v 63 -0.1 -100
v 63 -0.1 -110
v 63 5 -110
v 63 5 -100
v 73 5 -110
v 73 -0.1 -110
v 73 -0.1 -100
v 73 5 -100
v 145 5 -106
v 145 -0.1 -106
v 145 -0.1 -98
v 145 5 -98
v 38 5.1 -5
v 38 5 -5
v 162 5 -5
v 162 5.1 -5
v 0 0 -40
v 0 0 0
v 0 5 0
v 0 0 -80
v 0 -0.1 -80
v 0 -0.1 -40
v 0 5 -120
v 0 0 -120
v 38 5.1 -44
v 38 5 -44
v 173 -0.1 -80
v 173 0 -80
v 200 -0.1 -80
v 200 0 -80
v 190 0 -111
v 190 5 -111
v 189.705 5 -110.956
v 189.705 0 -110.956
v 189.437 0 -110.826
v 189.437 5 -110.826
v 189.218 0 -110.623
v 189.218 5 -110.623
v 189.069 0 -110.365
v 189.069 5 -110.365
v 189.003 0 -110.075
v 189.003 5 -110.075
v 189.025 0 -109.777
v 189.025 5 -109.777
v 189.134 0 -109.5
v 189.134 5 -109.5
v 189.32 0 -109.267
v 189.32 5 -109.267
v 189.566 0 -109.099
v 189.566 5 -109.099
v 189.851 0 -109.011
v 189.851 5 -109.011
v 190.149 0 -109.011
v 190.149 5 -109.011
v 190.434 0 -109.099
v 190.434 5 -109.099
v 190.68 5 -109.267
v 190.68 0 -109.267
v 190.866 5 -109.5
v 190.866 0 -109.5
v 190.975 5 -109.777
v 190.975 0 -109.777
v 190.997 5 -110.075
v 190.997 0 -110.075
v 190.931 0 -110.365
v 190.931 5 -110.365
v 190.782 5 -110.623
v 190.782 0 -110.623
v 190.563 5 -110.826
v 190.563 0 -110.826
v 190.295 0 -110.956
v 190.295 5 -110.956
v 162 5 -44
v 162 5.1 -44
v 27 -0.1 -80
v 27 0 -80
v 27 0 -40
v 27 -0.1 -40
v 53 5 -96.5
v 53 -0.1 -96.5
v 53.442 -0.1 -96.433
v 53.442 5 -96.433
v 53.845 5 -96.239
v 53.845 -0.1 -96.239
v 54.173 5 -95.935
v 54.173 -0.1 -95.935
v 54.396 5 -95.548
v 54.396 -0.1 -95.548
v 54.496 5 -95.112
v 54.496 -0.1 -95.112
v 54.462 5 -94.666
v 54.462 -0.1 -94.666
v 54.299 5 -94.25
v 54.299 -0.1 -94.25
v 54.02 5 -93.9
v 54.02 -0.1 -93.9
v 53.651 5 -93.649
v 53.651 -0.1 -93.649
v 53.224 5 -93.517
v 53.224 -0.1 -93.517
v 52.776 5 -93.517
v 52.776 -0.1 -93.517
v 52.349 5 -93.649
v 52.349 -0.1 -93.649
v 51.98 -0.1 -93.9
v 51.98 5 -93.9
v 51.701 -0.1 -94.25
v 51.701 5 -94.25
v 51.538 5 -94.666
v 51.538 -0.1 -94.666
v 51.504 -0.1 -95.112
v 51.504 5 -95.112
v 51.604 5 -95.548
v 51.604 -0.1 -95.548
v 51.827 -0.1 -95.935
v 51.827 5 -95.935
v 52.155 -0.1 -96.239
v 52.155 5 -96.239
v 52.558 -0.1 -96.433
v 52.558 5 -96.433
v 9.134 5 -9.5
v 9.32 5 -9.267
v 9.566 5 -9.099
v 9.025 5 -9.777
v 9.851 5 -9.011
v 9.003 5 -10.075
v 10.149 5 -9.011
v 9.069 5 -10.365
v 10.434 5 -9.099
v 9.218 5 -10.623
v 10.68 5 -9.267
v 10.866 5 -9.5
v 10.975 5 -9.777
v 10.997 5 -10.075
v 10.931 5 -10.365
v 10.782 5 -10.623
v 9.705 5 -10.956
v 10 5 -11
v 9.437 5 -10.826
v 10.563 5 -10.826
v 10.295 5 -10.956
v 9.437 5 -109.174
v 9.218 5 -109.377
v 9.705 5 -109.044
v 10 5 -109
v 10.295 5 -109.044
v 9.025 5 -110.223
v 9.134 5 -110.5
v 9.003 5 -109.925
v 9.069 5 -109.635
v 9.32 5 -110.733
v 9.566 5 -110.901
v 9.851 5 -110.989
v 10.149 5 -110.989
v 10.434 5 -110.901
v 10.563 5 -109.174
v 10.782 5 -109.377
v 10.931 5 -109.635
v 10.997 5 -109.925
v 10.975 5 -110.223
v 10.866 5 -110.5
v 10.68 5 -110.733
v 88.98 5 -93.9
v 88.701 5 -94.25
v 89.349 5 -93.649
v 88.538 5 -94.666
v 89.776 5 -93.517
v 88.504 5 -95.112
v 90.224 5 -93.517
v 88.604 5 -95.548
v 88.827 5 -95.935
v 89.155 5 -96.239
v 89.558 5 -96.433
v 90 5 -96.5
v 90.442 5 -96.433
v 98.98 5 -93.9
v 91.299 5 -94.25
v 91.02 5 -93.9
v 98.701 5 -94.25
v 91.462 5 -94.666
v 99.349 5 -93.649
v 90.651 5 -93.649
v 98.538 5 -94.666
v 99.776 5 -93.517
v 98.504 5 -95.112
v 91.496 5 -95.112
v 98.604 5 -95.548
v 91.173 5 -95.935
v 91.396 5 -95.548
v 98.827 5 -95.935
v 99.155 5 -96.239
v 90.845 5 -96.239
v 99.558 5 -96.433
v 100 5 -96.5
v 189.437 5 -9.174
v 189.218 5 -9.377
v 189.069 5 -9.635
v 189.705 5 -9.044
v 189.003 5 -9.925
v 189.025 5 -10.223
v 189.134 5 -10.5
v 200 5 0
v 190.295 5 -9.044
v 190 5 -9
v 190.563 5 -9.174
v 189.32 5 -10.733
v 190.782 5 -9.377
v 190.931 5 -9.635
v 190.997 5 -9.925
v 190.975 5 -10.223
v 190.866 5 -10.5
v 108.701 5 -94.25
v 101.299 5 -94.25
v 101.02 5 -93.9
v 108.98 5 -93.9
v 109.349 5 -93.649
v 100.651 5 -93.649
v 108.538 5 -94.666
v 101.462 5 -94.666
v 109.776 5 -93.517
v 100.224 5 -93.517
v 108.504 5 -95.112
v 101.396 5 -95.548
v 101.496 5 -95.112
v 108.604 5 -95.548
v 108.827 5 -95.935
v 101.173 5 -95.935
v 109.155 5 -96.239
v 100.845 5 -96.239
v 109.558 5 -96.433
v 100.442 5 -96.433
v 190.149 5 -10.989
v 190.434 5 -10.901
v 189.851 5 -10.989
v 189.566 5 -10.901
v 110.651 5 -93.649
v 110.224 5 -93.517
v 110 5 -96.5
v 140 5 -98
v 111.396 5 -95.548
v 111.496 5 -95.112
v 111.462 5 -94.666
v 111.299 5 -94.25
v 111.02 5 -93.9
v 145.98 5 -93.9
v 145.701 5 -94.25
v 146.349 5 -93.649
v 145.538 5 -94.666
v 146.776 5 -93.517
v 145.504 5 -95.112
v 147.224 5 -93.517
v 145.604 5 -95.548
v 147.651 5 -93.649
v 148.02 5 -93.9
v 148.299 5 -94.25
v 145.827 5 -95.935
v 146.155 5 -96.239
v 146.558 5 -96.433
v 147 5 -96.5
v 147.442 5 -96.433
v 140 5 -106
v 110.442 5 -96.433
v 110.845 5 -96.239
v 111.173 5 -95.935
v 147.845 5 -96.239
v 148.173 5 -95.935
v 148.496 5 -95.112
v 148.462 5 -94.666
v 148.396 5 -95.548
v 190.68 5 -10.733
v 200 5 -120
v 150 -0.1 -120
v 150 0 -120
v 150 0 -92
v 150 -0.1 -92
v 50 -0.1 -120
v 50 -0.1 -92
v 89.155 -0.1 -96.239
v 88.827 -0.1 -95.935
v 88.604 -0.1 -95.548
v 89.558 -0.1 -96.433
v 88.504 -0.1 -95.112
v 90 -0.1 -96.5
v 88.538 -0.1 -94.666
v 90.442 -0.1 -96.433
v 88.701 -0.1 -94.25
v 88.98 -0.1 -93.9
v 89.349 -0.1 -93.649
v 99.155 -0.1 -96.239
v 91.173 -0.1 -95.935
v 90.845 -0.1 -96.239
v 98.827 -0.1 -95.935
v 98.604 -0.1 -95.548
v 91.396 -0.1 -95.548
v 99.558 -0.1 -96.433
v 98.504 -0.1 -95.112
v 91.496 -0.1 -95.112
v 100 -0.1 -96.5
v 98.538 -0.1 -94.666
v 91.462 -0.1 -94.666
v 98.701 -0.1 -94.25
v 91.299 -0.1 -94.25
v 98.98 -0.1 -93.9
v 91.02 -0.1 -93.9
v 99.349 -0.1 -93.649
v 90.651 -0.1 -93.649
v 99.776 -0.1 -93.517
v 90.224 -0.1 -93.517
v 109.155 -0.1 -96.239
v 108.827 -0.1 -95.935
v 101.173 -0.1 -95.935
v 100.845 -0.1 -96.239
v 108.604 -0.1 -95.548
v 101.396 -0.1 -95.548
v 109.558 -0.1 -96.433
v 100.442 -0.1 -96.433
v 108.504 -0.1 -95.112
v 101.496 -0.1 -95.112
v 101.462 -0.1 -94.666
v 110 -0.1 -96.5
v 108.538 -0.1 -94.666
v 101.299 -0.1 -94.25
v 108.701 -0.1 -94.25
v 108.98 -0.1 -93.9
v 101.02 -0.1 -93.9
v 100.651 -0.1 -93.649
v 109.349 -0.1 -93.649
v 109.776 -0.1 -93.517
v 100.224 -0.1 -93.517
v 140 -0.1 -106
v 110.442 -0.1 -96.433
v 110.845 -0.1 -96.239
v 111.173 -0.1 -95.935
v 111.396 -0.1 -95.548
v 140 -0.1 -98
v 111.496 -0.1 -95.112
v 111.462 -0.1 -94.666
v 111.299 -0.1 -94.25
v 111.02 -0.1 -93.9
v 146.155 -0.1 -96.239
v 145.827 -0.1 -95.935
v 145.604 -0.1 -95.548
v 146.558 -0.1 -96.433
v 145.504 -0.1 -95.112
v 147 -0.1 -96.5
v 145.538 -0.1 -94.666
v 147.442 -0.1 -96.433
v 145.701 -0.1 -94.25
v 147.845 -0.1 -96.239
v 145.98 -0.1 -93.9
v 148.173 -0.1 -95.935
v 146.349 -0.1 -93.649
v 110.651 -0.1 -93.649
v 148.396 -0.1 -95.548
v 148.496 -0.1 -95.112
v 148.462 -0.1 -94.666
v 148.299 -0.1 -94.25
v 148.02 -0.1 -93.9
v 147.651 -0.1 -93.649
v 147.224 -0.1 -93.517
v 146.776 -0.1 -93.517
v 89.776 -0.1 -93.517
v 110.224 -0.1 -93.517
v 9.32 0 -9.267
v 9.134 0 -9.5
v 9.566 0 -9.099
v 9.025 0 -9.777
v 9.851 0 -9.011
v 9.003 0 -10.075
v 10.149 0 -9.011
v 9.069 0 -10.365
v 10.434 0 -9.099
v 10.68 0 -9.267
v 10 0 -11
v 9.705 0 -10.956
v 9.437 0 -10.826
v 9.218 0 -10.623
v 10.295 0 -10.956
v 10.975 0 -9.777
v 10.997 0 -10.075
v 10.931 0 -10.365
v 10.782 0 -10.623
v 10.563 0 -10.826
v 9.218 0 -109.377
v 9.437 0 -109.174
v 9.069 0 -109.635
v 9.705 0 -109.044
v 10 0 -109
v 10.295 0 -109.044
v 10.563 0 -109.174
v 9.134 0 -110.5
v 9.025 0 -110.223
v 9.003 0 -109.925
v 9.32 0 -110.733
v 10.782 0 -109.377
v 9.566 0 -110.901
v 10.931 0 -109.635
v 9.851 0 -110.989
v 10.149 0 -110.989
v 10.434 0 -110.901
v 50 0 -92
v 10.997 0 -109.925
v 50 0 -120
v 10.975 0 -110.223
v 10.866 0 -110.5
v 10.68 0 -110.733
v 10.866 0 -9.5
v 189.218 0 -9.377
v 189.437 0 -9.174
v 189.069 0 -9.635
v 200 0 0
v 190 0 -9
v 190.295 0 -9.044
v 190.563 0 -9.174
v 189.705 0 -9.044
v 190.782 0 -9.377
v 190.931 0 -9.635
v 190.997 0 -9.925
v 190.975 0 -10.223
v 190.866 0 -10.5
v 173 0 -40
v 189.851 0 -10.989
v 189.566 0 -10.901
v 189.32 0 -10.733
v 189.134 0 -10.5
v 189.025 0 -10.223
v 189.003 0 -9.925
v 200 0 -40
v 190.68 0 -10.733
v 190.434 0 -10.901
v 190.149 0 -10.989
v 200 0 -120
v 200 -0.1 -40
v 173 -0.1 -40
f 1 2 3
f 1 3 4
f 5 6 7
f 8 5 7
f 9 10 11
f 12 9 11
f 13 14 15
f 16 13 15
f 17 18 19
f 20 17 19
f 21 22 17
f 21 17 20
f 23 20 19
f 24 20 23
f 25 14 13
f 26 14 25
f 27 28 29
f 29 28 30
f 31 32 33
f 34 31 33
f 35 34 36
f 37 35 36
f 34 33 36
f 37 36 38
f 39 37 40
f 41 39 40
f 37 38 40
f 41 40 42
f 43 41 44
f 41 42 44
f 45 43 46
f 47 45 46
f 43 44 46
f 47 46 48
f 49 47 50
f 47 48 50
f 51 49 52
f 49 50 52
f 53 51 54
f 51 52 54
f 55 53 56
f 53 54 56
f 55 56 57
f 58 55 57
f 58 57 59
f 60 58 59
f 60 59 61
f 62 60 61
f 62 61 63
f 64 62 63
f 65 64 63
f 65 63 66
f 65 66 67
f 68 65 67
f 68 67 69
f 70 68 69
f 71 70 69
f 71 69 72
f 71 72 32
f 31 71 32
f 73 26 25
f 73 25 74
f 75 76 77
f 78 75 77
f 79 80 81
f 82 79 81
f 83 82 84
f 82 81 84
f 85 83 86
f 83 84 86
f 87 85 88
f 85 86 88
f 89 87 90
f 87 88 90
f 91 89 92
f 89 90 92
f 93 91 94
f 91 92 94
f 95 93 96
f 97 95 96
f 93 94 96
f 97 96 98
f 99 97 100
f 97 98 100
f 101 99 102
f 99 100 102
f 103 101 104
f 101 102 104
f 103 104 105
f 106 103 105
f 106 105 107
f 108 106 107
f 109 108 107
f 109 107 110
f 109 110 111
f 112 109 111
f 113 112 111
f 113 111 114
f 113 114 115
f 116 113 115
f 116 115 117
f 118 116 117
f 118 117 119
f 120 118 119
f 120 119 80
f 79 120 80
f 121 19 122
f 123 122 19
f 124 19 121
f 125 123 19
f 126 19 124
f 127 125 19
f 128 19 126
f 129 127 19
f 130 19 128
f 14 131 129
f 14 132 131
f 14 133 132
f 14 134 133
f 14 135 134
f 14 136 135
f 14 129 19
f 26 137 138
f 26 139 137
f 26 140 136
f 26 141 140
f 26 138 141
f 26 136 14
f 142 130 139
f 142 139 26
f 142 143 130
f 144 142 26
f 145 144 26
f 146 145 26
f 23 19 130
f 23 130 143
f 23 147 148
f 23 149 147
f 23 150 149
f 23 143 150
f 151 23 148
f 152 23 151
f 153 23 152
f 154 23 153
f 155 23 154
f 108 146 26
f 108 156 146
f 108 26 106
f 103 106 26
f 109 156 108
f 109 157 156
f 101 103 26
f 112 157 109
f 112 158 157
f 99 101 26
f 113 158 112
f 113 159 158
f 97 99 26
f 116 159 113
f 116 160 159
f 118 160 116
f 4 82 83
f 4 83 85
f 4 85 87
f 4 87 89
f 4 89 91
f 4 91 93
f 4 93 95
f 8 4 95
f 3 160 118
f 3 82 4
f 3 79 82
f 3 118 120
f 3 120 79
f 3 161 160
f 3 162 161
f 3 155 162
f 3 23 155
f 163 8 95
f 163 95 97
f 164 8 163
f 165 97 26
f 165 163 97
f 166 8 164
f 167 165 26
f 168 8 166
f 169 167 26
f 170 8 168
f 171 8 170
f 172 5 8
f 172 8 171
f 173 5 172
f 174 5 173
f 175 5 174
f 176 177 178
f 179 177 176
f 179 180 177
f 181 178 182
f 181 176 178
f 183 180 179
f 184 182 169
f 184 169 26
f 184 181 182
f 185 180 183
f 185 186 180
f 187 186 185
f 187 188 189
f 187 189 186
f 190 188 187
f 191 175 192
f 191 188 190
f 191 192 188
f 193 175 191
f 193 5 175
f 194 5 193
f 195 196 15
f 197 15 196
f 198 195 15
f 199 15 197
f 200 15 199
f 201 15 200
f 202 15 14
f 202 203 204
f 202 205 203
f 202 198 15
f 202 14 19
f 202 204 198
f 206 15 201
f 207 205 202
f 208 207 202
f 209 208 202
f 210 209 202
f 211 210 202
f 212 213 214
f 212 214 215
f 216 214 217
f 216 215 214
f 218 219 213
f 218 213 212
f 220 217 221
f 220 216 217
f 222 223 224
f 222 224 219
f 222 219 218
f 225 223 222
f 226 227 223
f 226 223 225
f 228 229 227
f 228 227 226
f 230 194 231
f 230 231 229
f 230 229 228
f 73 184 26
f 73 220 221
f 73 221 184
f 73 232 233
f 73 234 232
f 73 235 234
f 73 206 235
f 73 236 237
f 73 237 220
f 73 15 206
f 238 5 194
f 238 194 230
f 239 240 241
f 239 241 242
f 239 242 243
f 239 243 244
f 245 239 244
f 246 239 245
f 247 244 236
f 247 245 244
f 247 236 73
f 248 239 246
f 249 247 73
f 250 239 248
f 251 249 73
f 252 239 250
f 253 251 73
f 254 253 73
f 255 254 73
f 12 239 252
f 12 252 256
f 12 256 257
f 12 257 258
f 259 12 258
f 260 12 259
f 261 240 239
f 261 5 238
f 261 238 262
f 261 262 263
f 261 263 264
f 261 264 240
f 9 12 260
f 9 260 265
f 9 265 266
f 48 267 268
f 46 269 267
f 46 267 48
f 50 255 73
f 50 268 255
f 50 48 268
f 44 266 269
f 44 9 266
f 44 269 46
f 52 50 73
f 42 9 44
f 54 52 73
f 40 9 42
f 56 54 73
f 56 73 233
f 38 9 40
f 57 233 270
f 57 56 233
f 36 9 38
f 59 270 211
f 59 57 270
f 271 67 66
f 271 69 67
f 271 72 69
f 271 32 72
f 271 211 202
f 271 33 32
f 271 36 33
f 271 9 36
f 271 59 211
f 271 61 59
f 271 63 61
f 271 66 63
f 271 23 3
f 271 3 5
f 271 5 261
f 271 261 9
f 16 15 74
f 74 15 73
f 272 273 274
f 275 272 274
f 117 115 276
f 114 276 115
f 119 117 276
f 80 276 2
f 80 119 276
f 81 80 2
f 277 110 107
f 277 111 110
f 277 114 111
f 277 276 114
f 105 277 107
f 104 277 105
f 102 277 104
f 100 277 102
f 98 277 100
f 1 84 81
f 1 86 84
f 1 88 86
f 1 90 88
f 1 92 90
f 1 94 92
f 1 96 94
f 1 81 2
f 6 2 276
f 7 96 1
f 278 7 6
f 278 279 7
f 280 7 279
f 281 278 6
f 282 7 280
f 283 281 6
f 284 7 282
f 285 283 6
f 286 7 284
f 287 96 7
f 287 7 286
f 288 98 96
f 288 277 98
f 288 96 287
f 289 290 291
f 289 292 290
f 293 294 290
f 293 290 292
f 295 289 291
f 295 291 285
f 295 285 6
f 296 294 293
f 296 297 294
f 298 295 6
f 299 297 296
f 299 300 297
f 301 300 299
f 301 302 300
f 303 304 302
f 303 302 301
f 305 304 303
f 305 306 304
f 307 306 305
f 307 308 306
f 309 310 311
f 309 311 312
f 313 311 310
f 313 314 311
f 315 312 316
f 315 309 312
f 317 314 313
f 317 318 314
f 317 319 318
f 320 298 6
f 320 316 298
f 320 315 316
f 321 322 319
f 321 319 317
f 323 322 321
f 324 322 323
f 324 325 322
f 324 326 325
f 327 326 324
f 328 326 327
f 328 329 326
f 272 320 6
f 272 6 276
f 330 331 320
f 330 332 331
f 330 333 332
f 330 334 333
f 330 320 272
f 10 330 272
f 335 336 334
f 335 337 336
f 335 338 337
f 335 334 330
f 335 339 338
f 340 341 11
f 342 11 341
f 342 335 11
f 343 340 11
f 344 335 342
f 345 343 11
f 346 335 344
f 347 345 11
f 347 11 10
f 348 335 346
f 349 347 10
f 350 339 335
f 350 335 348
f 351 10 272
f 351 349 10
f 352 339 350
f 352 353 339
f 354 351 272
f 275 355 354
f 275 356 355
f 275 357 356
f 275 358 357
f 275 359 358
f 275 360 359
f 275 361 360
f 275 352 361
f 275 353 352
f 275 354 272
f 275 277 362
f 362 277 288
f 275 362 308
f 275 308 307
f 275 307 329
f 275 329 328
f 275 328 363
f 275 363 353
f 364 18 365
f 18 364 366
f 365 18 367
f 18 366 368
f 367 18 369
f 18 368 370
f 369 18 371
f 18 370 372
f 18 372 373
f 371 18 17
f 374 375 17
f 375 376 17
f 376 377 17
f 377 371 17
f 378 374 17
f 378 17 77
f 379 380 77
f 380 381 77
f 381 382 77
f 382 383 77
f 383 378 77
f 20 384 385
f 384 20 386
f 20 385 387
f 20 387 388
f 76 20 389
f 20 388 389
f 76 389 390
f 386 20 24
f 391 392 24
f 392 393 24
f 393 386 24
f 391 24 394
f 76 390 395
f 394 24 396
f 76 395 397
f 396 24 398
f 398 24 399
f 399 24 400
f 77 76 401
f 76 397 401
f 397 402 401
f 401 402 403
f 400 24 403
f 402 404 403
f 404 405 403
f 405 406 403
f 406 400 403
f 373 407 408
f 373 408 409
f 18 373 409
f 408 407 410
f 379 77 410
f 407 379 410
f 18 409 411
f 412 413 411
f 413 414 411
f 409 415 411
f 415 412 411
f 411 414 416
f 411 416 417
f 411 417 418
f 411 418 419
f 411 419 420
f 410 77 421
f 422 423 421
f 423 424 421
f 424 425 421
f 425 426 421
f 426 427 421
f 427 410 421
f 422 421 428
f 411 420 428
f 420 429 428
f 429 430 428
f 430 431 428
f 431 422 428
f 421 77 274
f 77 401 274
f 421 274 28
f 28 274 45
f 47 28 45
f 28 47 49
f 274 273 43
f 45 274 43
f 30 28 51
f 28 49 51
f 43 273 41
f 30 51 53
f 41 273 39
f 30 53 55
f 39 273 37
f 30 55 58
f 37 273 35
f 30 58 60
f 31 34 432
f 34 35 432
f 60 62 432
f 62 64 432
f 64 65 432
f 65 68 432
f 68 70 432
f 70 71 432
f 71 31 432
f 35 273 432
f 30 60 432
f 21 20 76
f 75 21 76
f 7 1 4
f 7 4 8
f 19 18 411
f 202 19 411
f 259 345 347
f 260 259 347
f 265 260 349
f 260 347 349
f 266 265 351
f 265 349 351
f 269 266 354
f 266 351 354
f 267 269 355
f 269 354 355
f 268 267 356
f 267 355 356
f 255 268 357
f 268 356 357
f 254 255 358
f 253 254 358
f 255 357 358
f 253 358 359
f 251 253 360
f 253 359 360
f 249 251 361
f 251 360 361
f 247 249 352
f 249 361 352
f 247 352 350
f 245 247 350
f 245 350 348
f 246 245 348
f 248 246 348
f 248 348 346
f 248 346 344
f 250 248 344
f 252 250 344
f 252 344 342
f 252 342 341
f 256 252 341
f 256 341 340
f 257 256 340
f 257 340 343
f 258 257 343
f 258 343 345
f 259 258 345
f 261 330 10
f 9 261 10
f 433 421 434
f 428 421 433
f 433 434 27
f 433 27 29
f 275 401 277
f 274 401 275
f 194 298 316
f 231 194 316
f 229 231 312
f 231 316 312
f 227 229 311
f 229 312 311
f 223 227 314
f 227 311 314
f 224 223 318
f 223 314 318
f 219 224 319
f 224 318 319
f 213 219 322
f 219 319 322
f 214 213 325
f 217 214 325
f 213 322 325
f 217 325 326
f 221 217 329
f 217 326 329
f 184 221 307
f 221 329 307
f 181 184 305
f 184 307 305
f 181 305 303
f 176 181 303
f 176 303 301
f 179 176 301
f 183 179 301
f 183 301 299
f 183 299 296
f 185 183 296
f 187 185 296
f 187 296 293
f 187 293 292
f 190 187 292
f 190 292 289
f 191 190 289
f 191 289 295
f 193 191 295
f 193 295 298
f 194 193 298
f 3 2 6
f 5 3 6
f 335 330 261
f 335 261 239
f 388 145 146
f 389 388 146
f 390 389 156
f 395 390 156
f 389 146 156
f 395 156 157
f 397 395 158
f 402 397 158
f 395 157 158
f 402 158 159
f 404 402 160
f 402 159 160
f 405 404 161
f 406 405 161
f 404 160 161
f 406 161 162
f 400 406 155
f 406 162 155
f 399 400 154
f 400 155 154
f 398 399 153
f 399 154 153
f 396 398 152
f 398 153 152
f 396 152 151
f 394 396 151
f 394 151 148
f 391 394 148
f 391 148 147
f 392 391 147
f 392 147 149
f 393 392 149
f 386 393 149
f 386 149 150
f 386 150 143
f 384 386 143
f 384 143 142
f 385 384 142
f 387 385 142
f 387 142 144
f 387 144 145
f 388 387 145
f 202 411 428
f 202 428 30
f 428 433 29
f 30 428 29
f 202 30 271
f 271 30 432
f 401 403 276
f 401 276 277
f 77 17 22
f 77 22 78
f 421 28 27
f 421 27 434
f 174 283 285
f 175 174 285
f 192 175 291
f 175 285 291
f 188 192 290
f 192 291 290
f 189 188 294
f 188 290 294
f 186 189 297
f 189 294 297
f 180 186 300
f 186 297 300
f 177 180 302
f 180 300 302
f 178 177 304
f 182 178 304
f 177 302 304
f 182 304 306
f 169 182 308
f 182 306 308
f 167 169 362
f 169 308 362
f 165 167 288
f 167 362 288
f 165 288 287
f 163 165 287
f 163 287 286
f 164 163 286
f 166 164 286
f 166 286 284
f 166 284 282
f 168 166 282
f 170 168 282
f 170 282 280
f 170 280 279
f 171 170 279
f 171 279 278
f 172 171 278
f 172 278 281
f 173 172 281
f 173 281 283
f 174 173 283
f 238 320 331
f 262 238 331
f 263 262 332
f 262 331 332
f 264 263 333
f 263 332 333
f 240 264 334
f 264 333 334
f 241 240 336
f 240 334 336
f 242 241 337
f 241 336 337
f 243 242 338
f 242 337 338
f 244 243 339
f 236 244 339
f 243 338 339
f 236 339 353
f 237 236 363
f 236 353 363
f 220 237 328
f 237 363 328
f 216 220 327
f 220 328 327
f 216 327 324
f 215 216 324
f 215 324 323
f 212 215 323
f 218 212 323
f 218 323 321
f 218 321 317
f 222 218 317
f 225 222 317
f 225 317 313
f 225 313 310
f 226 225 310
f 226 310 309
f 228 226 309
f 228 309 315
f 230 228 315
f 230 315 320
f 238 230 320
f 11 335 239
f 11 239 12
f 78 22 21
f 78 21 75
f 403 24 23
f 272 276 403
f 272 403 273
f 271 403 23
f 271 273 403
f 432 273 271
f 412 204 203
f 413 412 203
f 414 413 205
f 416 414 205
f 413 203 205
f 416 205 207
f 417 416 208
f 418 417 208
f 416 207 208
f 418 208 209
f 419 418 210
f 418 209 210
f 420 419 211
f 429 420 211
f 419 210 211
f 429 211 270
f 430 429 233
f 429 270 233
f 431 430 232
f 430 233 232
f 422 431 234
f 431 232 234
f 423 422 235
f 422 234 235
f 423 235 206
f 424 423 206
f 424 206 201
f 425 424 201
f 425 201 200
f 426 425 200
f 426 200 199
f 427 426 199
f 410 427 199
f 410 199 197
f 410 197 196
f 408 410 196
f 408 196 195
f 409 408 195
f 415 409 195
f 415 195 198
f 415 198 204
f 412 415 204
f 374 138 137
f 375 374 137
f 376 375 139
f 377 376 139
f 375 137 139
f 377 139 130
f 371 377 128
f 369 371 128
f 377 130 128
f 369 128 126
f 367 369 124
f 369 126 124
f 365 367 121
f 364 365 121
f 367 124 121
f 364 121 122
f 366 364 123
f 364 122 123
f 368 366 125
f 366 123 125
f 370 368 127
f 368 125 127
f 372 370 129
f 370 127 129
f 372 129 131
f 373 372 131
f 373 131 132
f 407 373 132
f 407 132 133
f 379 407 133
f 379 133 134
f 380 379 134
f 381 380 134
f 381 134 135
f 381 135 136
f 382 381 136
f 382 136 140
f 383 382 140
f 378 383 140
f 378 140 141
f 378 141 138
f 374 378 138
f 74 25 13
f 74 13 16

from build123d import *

# Parameters (mm, degrees)
SKETCH1_W           = 200
SKETCH1_H           = 120
BOSS_EXTRUDE1_DEPTH = 5
SKETCH2_R           = 1
CUT_EXTRUDE1_DEPTH  = 10
SKETCH3_W           = 27
SKETCH3_H           = 40
BOSS_EXTRUDE2_DEPTH = 0.1
SKETCH4_W           = 100
SKETCH4_H           = 28
BOSS_EXTRUDE3_DEPTH = 0.1
SKETCH5_R           = 1.5
SKETCH5_W           = 5
SKETCH5_H           = 8
SKETCH5_W_2         = 10
SKETCH5_H_2         = 10
CUT_EXTRUDE2_DEPTH  = 234.293827608
SKETCH6_W           = 124
SKETCH6_H           = 39
BOSS_EXTRUDE4_DEPTH = 0.1


with BuildPart() as part:
    # Sketch1 → Boss-Extrude1 (new body)
    with BuildSketch(Plane(origin=(0, 0, 0), x_dir=(1, 0, 0), z_dir=(0, 1, 0))):
        with Locations((100, 60)):
            Rectangle(SKETCH1_W, SKETCH1_H)
    extrude(amount=BOSS_EXTRUDE1_DEPTH)

    # Sketch2 → Cut-Extrude1 (cut)
    with BuildSketch(Plane(origin=(0, 5, 0), x_dir=(1, 0, 0), z_dir=(0, 1, 0))):
        with Locations(Location((10, 110, 0), (0, 0, 270))):
            Circle(SKETCH2_R)
        with Locations(Location((190, 110, 0), (0, 0, 90))):
            Circle(SKETCH2_R)
        with Locations(Location((190, 10, 0), (0, 0, 270))):
            Circle(SKETCH2_R)
        with Locations(Location((10, 10, 0), (0, 0, 90))):
            Circle(SKETCH2_R)
    extrude(amount=-CUT_EXTRUDE1_DEPTH, mode=Mode.SUBTRACT)

    # Sketch3 → Boss-Extrude2 (add)
    with BuildSketch(Plane.XZ):
        with Locations((13.5, -60)):
            Rectangle(SKETCH3_W, SKETCH3_H)
        with Locations((186.5, -60)):
            Rectangle(SKETCH3_W, SKETCH3_H)
    extrude(amount=BOSS_EXTRUDE2_DEPTH)

    # Sketch4 → Boss-Extrude3 (add)
    with BuildSketch(Plane.XZ):
        with Locations((100, -106)):
            Rectangle(SKETCH4_W, SKETCH4_H)
    extrude(amount=BOSS_EXTRUDE3_DEPTH)

    # Sketch5 → Cut-Extrude2 (cut, through all)
    with BuildSketch(Plane.XZ.offset(0.1)):
        with Locations(Location((53, -95, 0), (0, 0, 270))):
            Circle(SKETCH5_R)
        with Locations(Location((90, -95, 0), (0, 0, 270))):
            Circle(SKETCH5_R)
        with Locations(Location((100, -95, 0), (0, 0, 270))):
            Circle(SKETCH5_R)
        with Locations(Location((110, -95, 0), (0, 0, 270))):
            Circle(SKETCH5_R)
        with Locations(Location((147, -95, 0), (0, 0, 270))):
            Circle(SKETCH5_R)
        with Locations((142.5, -102)):
            Rectangle(SKETCH5_W, SKETCH5_H)
        with Locations((68, -105)):
            Rectangle(SKETCH5_W_2, SKETCH5_H_2)
    extrude(amount=-CUT_EXTRUDE2_DEPTH, mode=Mode.SUBTRACT)

    # Sketch6 → Boss-Extrude4 (add)
    with BuildSketch(Plane(origin=(0, 5, 0), x_dir=(1, 0, 0), z_dir=(0, 1, 0))):
        with Locations((100, 24.5)):
            Rectangle(SKETCH6_W, SKETCH6_H)
    extrude(amount=BOSS_EXTRUDE4_DEPTH)


solid = part.part
